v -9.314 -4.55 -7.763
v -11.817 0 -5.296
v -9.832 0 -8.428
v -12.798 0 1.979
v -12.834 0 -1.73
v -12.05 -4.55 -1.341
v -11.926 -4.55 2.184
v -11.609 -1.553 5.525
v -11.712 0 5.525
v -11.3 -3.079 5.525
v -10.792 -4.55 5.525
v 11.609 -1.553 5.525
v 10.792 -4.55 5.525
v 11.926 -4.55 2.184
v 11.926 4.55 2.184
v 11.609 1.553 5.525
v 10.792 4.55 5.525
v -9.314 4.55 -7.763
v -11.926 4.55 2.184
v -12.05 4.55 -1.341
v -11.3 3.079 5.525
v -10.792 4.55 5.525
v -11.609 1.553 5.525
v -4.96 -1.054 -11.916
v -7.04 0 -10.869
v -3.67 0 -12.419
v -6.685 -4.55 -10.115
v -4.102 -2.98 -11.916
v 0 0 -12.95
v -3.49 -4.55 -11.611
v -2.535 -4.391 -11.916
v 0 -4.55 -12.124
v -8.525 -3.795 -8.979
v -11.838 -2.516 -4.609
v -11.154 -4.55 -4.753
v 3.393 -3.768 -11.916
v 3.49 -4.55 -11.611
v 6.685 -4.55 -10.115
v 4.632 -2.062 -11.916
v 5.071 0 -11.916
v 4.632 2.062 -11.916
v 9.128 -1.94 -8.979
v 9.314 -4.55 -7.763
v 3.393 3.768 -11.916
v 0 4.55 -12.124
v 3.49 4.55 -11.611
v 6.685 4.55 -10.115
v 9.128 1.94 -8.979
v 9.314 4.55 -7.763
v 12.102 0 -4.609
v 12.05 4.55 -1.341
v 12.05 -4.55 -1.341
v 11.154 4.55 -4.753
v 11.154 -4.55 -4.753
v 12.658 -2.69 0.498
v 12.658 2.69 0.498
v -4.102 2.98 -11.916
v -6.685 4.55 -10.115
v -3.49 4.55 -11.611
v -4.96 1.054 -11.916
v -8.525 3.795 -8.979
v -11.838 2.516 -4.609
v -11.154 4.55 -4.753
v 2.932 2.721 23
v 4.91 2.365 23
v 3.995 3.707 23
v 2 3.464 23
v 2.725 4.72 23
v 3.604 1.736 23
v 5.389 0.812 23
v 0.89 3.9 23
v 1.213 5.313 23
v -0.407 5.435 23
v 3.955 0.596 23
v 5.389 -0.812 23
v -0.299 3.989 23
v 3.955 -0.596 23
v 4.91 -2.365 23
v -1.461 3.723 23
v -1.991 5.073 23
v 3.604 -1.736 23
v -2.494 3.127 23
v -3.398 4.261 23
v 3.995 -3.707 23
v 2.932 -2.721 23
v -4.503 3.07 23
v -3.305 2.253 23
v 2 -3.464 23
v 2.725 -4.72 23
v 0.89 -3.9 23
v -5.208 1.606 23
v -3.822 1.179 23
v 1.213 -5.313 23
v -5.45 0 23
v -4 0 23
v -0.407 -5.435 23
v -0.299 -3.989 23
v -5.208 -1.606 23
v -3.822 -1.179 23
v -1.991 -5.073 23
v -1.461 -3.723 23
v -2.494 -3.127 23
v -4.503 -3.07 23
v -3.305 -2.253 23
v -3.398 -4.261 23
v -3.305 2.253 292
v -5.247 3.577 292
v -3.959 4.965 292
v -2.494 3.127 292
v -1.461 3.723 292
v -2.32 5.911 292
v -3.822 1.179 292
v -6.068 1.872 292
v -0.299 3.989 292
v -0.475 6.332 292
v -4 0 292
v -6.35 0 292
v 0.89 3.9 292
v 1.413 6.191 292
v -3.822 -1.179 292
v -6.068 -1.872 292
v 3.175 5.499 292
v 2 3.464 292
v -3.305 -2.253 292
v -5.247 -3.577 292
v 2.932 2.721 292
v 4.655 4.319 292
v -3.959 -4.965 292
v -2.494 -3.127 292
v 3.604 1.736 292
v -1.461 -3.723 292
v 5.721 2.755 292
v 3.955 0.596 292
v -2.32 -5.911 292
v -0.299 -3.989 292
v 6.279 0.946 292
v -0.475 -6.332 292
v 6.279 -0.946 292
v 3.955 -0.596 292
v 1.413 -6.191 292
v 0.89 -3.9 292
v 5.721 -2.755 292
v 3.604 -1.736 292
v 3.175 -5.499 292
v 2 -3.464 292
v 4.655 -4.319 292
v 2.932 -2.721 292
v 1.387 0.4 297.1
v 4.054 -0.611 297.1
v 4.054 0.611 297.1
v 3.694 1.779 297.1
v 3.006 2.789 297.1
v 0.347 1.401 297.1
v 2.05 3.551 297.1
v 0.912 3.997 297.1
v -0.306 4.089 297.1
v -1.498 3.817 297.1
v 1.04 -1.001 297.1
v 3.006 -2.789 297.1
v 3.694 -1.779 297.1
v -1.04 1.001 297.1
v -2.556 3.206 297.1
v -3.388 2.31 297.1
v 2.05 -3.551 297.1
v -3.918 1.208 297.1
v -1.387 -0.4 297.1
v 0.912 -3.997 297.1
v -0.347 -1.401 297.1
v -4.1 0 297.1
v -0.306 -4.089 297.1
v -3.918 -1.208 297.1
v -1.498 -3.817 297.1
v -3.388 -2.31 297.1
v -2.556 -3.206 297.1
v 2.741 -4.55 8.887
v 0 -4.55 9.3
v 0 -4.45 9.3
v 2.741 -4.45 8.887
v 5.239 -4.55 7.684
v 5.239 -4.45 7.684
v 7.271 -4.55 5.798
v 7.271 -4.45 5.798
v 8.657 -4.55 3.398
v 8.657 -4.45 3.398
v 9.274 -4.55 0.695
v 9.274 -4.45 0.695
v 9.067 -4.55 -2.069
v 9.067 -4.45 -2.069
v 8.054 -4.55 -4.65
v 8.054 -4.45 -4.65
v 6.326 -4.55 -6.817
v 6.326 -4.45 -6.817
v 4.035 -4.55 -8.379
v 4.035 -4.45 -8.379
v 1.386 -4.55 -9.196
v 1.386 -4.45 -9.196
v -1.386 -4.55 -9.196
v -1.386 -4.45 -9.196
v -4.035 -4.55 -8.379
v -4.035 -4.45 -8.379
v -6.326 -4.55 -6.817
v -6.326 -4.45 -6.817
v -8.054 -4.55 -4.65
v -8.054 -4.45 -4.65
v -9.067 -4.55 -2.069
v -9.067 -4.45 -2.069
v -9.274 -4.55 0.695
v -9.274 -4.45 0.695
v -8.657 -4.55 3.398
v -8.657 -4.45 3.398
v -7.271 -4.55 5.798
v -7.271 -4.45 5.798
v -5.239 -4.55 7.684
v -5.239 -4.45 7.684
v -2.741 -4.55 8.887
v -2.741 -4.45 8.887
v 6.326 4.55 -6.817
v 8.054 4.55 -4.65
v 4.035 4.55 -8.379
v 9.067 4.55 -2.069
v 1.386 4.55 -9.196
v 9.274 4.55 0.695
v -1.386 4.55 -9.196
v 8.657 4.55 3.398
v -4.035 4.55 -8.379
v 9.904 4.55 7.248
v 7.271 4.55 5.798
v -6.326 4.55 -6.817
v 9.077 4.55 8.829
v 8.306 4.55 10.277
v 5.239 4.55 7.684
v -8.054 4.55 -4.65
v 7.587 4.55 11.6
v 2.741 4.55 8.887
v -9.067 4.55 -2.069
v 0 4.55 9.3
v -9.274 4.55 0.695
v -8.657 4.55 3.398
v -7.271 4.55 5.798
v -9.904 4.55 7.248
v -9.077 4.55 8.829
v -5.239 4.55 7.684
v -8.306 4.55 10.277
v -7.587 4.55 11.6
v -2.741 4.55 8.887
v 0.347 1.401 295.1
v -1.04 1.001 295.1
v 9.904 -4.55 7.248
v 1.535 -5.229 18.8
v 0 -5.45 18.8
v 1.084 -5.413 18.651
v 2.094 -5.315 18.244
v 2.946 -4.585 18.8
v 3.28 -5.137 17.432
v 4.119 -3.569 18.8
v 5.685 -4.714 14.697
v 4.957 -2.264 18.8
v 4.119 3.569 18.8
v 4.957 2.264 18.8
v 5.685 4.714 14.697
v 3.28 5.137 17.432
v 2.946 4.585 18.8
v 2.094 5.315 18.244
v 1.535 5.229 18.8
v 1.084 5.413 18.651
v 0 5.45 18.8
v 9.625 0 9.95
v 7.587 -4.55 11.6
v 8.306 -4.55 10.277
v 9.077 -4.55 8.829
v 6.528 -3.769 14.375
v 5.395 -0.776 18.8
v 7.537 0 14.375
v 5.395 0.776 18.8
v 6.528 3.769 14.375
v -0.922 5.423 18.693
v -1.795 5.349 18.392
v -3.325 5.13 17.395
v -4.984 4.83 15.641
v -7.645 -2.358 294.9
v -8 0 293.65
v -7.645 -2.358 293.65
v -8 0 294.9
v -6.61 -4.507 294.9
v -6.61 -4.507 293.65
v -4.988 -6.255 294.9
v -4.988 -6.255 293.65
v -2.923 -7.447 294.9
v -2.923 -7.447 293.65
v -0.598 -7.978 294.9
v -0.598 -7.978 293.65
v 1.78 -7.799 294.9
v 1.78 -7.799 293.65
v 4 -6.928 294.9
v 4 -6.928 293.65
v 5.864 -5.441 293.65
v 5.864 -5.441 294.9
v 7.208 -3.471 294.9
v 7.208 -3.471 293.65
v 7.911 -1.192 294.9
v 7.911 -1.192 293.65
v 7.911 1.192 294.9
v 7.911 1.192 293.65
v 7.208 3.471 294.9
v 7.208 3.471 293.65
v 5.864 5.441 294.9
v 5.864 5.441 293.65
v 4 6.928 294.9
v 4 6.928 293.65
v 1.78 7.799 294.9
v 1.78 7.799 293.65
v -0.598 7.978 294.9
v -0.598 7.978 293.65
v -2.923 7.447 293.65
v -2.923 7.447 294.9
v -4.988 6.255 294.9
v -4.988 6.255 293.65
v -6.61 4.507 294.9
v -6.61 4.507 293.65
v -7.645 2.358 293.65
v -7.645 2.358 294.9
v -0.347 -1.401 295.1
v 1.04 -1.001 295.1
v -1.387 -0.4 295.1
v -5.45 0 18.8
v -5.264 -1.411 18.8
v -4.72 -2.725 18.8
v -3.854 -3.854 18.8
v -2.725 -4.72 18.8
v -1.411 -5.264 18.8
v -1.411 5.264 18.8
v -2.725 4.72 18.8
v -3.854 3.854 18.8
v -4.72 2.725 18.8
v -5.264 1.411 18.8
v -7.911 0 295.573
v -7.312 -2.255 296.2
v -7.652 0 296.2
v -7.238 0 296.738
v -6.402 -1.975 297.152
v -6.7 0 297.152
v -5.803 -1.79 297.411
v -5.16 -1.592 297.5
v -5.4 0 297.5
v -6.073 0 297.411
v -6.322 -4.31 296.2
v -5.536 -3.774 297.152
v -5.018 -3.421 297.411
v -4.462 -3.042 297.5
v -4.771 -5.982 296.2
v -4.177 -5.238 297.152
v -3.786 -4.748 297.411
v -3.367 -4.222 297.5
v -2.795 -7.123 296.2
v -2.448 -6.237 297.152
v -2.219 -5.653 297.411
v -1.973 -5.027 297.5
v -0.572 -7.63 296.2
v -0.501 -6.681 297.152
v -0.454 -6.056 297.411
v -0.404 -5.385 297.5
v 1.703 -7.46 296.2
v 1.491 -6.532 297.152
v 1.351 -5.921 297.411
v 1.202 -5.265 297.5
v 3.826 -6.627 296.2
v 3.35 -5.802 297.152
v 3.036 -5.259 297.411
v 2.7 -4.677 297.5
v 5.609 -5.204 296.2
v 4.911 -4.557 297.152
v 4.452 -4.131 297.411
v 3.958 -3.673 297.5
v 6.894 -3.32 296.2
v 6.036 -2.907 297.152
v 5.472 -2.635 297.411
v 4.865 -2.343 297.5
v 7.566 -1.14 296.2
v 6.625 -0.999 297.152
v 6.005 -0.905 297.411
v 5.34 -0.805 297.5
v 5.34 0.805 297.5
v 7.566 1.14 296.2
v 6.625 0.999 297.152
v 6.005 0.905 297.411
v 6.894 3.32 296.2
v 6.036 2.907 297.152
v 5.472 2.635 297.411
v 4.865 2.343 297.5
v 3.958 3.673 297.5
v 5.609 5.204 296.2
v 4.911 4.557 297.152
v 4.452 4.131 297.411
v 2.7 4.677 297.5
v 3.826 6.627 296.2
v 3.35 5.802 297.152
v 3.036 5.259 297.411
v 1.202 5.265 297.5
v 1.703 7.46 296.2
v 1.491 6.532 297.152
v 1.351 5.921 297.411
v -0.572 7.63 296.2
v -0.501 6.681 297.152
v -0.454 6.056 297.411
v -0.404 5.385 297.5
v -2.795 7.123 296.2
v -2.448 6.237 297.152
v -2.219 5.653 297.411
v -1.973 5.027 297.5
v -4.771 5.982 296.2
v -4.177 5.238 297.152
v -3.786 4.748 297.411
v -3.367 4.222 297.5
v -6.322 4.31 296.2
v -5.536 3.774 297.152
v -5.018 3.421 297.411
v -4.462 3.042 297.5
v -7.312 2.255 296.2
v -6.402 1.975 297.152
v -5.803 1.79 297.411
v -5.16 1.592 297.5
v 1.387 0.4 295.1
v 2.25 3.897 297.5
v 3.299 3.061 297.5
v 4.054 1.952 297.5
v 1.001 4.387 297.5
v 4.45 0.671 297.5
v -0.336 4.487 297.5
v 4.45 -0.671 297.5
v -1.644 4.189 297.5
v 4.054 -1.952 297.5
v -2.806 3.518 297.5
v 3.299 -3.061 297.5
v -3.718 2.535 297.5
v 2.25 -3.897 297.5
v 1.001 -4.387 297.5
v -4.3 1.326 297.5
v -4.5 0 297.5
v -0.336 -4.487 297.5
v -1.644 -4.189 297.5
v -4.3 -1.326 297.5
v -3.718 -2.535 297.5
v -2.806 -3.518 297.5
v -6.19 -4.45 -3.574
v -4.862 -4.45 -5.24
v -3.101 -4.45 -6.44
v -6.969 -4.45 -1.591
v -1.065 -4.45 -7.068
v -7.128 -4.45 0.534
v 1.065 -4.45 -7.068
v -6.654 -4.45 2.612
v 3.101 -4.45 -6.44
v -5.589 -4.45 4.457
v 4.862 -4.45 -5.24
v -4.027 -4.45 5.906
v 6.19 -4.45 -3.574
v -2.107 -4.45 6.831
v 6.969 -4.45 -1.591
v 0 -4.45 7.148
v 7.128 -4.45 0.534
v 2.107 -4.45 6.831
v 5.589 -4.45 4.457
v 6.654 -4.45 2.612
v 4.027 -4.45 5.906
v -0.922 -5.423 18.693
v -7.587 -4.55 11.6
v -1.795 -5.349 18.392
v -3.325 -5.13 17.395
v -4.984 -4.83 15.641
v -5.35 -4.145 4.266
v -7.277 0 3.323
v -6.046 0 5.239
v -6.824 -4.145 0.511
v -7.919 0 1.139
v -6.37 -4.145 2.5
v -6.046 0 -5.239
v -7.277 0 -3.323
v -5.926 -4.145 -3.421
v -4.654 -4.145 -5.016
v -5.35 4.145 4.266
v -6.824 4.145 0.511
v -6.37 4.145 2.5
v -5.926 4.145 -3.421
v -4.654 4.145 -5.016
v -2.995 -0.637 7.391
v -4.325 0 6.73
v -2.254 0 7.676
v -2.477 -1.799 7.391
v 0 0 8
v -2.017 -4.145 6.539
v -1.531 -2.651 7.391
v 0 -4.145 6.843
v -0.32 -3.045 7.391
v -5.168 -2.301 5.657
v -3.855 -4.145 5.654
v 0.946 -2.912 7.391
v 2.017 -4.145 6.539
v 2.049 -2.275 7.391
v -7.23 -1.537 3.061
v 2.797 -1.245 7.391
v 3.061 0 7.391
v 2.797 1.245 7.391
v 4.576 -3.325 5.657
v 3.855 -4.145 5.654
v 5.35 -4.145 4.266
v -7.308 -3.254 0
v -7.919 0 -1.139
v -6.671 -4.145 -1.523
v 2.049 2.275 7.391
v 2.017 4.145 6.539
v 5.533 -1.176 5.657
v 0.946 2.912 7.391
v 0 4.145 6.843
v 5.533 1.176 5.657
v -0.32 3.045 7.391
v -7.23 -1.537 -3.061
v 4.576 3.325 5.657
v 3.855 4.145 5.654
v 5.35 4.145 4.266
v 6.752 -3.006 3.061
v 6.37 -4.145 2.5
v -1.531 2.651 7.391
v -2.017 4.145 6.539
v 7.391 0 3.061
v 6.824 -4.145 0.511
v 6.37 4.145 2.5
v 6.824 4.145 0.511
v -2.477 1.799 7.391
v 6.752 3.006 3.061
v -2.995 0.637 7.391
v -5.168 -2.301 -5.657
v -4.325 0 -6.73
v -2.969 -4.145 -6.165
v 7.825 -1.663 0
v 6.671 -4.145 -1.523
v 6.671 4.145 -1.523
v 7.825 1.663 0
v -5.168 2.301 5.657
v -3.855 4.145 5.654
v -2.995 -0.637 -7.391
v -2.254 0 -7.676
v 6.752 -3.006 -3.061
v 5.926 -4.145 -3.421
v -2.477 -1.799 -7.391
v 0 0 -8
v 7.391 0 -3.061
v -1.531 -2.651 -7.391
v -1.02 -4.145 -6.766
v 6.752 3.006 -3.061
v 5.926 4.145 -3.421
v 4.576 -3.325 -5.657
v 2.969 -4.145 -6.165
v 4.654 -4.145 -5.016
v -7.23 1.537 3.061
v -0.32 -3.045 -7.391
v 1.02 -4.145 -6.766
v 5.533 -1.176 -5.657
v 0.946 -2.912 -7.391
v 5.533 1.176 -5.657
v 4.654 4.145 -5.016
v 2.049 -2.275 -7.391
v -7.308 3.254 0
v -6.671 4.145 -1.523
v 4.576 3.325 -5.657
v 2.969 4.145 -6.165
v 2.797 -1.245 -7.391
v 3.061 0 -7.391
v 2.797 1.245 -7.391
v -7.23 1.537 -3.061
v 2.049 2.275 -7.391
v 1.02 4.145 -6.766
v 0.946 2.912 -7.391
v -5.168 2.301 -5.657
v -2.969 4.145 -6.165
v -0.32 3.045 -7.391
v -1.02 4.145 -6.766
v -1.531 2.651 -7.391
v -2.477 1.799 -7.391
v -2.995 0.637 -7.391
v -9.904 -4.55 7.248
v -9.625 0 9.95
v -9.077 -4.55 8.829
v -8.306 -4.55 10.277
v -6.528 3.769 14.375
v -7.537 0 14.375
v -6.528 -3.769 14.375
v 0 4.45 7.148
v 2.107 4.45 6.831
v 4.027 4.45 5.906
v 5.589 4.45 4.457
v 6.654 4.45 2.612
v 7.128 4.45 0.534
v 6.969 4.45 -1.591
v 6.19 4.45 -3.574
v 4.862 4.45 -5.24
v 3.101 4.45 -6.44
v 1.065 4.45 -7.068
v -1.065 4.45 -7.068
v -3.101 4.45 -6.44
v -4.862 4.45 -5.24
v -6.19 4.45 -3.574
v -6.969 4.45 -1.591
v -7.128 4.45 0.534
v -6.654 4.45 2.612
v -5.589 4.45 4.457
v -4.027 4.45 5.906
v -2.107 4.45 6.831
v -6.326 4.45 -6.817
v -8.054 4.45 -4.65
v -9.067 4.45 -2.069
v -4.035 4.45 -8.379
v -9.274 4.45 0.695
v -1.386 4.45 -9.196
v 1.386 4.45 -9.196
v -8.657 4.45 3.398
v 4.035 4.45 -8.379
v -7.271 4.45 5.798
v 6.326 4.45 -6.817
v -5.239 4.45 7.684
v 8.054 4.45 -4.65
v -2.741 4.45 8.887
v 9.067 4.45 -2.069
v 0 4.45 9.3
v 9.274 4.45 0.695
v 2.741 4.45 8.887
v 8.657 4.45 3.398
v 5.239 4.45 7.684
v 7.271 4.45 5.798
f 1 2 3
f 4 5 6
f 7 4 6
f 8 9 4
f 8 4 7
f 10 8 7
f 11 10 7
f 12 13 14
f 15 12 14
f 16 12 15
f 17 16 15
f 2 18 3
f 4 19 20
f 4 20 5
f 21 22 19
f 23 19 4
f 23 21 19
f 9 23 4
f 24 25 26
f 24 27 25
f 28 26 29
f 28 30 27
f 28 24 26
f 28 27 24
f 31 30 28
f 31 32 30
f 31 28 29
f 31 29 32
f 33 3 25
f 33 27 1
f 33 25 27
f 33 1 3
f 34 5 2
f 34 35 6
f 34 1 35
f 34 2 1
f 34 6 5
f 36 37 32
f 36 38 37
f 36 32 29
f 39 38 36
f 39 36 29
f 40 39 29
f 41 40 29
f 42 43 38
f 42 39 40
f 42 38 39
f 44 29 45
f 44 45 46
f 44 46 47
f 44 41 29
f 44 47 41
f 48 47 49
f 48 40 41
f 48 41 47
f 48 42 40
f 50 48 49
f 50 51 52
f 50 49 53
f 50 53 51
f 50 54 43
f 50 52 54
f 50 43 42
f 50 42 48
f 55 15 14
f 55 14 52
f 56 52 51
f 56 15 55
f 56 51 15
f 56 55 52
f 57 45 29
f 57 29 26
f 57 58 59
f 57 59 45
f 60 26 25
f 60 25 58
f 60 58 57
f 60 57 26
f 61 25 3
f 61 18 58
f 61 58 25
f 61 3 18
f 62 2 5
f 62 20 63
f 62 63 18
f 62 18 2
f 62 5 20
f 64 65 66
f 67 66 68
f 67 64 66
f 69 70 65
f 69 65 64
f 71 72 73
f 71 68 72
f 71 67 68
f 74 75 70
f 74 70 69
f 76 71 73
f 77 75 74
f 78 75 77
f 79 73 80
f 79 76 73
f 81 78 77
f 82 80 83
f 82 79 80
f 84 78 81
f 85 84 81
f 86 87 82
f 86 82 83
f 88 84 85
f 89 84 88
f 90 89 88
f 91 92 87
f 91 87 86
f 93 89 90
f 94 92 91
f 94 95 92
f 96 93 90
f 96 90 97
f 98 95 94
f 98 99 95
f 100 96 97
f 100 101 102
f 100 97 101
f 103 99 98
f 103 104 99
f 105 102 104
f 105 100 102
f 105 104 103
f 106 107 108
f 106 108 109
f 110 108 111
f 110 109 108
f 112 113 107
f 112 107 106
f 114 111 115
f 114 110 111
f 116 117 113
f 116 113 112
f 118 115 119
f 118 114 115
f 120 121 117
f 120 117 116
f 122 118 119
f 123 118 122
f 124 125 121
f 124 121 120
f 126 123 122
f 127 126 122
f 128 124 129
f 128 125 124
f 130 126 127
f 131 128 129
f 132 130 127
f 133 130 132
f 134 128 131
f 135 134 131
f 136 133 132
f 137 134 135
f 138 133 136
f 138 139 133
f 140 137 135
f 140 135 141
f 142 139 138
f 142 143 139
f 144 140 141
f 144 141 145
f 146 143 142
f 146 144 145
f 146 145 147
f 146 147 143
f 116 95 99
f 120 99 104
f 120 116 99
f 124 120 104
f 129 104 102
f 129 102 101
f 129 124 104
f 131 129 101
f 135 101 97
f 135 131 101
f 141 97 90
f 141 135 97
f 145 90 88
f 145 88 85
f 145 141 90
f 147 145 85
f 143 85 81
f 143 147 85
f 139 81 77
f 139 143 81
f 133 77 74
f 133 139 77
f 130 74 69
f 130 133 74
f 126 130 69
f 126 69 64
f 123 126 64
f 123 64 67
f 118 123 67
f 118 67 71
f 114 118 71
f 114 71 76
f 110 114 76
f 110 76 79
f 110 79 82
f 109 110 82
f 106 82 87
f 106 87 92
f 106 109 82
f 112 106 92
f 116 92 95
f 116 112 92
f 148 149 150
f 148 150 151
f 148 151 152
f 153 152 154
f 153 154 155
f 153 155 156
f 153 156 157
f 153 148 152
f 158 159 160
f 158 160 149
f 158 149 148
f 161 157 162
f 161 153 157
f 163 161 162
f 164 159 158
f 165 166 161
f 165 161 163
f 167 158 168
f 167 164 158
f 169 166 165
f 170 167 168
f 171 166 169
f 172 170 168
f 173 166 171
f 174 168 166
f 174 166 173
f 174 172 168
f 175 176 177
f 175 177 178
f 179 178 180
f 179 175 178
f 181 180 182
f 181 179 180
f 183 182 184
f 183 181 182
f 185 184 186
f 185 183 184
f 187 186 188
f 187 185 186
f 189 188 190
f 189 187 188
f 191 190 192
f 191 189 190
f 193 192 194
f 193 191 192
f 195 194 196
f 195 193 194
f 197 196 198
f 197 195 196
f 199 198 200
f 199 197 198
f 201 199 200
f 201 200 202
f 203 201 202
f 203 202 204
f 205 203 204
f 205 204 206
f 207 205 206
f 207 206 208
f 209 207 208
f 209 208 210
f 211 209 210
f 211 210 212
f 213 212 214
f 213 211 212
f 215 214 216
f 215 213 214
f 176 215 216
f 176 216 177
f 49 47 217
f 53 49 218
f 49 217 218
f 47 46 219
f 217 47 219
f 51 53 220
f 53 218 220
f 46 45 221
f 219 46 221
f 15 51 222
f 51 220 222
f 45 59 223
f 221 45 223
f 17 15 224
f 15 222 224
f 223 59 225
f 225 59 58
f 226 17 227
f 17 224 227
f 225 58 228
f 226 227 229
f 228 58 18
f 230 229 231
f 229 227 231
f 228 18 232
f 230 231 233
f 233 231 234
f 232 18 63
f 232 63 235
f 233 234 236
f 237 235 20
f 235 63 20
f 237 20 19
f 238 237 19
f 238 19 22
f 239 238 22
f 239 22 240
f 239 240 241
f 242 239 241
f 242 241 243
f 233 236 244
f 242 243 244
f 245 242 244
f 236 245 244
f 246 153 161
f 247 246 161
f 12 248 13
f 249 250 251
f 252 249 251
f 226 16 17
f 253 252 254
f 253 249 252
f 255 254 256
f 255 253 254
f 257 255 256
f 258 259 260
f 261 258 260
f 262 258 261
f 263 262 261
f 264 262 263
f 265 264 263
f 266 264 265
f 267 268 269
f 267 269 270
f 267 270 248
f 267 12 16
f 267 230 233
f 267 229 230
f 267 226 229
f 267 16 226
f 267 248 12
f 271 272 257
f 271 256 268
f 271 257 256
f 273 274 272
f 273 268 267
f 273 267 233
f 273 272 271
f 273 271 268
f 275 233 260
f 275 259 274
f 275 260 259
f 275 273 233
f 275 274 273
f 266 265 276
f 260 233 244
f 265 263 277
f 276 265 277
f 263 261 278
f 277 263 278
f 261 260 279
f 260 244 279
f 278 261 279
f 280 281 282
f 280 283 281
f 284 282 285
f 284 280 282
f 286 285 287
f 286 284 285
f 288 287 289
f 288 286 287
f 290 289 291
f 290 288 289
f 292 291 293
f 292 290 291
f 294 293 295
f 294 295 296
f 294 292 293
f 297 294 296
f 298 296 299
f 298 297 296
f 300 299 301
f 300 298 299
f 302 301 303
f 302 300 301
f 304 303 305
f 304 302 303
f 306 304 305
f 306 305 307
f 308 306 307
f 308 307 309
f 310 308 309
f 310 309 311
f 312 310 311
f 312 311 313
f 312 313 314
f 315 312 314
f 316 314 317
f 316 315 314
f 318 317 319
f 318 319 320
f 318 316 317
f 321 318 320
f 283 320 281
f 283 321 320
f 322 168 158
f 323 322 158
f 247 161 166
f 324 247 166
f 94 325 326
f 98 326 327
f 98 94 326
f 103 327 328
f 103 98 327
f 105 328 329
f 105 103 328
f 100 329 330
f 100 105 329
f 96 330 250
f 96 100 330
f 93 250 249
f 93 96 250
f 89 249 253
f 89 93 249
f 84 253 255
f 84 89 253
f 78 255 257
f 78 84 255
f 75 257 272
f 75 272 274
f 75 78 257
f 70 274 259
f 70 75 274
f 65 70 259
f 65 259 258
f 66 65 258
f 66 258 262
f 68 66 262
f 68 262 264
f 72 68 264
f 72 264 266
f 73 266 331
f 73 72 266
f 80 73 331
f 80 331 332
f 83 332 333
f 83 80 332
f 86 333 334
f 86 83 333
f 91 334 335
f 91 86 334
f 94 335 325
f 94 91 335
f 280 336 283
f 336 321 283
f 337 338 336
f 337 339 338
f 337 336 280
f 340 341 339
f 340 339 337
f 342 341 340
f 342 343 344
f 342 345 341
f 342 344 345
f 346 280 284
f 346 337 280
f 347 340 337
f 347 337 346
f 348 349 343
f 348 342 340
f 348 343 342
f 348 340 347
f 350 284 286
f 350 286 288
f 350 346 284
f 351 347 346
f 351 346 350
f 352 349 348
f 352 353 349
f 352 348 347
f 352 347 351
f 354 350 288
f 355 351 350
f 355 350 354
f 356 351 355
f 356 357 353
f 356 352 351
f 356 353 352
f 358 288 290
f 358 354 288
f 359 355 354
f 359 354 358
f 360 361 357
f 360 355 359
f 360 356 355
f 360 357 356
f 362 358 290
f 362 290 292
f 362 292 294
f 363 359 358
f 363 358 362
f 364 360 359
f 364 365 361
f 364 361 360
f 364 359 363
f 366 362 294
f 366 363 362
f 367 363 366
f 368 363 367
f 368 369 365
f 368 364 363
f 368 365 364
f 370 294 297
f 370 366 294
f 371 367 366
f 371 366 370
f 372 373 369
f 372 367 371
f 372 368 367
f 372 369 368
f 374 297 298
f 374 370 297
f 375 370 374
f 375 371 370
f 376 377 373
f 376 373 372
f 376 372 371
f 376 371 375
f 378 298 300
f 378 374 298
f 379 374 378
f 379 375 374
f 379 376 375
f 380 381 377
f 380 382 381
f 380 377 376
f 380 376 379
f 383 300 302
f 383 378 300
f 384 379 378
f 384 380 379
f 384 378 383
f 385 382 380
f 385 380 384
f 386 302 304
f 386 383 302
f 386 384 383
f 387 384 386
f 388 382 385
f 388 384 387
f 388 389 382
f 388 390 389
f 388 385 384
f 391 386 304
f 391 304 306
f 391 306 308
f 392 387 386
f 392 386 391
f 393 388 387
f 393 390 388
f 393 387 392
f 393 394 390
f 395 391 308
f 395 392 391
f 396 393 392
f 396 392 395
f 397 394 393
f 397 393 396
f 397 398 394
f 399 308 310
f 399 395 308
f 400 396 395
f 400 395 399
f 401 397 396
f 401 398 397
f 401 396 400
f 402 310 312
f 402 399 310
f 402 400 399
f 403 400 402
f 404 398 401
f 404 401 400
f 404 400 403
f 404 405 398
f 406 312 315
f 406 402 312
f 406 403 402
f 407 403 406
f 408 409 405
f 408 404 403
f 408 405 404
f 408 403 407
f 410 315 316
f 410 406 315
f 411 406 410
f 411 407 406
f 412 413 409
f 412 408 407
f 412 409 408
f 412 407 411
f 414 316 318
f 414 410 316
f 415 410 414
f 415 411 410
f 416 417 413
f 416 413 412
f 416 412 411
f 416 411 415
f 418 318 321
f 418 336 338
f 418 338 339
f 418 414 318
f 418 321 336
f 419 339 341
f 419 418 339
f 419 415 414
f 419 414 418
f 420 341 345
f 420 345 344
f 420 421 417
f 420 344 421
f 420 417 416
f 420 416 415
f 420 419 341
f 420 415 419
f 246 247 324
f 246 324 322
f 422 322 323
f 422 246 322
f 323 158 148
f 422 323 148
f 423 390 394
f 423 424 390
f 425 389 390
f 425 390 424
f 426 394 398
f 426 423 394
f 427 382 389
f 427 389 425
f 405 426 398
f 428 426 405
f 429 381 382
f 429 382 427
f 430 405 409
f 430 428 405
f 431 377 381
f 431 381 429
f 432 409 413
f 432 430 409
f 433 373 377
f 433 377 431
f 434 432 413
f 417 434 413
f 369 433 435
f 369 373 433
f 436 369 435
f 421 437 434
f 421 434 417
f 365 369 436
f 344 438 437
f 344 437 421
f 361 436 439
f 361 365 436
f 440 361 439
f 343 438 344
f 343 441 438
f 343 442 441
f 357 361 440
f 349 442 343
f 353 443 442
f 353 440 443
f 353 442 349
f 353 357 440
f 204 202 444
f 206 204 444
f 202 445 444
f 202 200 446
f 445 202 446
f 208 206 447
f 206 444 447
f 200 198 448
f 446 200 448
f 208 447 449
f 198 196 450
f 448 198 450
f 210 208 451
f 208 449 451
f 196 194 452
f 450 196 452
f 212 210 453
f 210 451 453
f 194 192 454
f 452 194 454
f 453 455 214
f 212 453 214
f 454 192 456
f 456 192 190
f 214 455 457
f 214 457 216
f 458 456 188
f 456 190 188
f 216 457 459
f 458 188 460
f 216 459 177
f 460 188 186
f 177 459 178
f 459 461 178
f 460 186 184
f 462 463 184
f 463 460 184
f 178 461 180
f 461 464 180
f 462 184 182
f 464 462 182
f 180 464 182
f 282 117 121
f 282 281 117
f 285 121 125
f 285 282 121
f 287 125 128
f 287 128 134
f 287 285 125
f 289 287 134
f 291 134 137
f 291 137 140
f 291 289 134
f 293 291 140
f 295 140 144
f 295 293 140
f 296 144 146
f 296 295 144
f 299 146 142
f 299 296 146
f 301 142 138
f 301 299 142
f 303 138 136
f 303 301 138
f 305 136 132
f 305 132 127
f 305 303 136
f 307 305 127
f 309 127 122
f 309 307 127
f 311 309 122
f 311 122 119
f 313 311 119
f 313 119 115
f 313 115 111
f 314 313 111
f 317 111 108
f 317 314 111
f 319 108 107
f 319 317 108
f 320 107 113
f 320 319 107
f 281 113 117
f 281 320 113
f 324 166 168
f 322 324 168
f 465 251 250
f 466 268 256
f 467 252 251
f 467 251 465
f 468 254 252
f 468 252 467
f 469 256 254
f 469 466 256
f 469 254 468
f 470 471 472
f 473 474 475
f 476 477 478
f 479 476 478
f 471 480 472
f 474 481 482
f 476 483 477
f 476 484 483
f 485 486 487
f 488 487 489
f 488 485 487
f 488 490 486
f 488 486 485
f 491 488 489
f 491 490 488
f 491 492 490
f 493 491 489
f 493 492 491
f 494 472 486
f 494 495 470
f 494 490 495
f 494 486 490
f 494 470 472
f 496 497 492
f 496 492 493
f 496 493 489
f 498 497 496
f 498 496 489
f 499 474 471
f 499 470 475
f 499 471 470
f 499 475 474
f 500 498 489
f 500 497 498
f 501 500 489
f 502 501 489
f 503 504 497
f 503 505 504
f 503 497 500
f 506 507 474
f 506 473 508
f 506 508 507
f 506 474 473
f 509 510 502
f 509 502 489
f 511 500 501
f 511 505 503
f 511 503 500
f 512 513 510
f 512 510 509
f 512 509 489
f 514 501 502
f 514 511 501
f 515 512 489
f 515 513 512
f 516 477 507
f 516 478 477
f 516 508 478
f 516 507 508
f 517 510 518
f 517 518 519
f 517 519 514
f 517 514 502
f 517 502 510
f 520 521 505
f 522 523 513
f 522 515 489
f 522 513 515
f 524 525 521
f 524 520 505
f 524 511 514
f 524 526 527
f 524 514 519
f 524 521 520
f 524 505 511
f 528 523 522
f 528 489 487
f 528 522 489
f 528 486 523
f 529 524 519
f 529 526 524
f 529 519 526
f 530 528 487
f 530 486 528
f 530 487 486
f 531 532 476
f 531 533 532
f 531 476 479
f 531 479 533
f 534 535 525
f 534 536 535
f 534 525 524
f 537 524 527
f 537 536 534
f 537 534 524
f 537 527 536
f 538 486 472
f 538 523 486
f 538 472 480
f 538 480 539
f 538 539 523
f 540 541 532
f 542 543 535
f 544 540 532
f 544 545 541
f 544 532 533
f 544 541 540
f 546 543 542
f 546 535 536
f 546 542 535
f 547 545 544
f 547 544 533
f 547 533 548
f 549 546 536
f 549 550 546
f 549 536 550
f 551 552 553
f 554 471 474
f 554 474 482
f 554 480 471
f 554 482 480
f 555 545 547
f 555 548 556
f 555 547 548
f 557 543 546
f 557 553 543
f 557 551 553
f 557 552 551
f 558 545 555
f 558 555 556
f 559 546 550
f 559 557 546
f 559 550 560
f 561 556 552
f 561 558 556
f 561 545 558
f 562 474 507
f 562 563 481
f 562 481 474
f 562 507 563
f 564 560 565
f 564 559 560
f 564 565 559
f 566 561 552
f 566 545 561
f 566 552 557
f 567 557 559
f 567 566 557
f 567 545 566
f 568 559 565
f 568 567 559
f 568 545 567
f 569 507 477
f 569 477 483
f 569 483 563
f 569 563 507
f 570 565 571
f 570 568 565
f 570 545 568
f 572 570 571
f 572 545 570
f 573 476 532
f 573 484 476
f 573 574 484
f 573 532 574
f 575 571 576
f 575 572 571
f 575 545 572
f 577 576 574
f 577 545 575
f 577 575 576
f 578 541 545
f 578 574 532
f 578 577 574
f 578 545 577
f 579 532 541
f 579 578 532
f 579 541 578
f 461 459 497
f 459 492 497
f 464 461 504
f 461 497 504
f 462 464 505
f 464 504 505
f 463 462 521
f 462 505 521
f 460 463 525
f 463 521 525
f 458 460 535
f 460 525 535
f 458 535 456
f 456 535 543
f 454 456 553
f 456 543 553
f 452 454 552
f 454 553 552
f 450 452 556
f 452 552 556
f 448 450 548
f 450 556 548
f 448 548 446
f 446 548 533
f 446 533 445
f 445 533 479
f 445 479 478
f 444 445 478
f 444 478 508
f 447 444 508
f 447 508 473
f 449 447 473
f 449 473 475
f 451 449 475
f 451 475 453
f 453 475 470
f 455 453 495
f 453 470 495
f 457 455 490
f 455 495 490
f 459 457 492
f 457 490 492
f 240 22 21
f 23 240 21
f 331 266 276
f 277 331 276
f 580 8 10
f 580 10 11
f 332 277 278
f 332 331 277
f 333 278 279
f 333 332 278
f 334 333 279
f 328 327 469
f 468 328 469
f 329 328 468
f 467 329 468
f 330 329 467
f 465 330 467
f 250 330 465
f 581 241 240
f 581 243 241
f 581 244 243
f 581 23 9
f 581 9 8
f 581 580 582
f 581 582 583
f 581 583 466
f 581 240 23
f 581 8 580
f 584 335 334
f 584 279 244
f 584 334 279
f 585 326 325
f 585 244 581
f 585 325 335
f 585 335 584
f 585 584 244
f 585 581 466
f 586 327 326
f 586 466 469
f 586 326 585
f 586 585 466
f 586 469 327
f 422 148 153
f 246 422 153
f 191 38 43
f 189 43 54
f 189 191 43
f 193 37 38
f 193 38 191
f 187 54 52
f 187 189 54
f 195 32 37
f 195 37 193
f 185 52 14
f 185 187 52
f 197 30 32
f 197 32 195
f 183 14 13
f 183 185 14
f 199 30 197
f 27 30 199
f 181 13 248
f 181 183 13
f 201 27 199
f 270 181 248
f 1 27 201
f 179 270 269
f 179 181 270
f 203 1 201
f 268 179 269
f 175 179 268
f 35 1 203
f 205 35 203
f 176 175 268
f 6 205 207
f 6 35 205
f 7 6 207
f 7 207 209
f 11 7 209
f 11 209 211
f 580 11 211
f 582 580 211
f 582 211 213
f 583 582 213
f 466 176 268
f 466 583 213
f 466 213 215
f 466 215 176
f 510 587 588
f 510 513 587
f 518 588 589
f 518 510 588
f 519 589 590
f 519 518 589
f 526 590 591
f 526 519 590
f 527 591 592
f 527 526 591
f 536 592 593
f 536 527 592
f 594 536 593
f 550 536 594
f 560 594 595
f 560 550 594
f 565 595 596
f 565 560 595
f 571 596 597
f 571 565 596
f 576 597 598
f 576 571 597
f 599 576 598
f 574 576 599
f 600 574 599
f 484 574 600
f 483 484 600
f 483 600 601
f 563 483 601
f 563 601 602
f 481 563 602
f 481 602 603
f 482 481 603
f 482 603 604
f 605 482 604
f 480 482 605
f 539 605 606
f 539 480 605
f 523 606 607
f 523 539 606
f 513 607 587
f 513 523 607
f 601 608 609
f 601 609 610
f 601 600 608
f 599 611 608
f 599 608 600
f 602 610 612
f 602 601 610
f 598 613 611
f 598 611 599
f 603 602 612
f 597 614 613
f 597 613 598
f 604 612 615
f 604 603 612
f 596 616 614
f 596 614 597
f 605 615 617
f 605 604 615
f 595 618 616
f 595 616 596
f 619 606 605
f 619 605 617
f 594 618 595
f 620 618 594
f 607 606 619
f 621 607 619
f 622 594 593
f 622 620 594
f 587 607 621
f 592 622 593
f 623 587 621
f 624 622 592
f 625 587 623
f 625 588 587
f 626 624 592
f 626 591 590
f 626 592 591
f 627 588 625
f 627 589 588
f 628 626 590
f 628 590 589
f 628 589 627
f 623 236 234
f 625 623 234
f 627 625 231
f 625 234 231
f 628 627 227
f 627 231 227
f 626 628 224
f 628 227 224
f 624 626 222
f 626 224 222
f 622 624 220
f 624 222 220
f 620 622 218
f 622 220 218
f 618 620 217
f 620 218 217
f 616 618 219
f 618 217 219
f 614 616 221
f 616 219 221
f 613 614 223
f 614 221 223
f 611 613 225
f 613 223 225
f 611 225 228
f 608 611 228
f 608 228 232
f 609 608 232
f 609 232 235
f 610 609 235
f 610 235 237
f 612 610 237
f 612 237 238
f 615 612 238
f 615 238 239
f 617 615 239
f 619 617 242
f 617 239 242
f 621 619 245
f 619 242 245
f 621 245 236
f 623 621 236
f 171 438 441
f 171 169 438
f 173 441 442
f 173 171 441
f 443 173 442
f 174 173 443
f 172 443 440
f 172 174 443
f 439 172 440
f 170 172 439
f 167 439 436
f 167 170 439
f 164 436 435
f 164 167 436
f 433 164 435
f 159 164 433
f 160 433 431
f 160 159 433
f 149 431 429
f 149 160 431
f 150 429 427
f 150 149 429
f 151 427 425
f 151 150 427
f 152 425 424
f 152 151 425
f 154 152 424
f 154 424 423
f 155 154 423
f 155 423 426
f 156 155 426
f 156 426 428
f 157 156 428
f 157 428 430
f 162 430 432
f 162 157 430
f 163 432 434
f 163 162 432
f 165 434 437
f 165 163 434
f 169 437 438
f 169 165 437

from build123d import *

# Parameters (mm, degrees)
EXTRUDE1_DEPTH      = 2
EXTRUDE2_DEPTH      = 299.063172834
EXTRUDE2_DEPTH_BACK = 299.063172834
SKETCH4_R           = 9.3
EXTRUDE3_DEPTH      = 0.1
CHAMFER1_SIZE       = 0.5


with BuildPart() as part:
    # Sketch1 → Revolve1 (revolve)
    with BuildSketch(Plane(origin=(0, 0, 0), x_dir=(1, 0, 0), z_dir=(0, 1, 0))):
        with BuildLine():
            Line((-11.712232269, -5.525044369), (-5.45, -18.8))
            Line((-5.45, -18.8), (-5.45, -23))
            Line((-5.45, -23), (-4, -23))
            Line((-4, -23), (-4, -292))
            Line((-4, -292), (-6.35, -292))
            Line((-6.35, -292), (-8, -293.65))
            Line((-8, -293.65), (-8, -294.9))
            ThreePointArc((-8, -294.9), (-7.238477631, -296.738477631), (-5.4, -297.5))
            Line((-5.4, -297.5), (-4.5, -297.5))
            Line((-4.5, -297.5), (-4.1, -297.1))
            Line((-4.1, -297.1), (0, -297.1))
            Line((0, -297.1), (0, -8))
            ThreePointArc((0, -8), (-8, 0), (0, 8))
            Line((0, 8), (0, 12.95))
            ThreePointArc((0, 12.95), (-10.937363132, 6.933728269), (-11.712232269, -5.525044369))
        make_face()
    revolve(axis=Axis((0, 0, 0), (0, 0, 1)))

    # Sketch2 → Extrude1 (cut)
    with BuildSketch(Plane.XY.offset(297.1)):
        Polygon((1.38672922, 0.400394061), (0.346613181, 1.401139763), (-1.040116039, 1.000745702), (-1.38672922, -0.400394061), (-0.346613181, -1.401139763), (1.040116039, -1.000745702), align=None)
    extrude(amount=-EXTRUDE1_DEPTH, mode=Mode.SUBTRACT)

    # Sketch3 → Extrude2 (cut, two sides: drawn at the far end of the back side and taken through both)
    with BuildSketch(Plane(origin=(0, 0, 0), x_dir=(0, 0, -1), z_dir=(1, 0, 0)).offset(-EXTRUDE2_DEPTH_BACK)):
        with BuildLine():
            Line((18.703975577, 4.55), (-11.6, 4.55))
            ThreePointArc((-11.6, 4.55), (-15.228015987, 4.775872106), (-18.8, 5.45))
            Line((-18.8, 5.45), (-23, 5.45))
            Line((-23, 5.45), (-23, 17.731418952))
            Line((-23, 17.731418952), (18.703975577, 17.731418952))
            Line((18.703975577, 17.731418952), (18.703975577, 4.55))
        make_face()
        with BuildLine():
            Line((18.703975577, -17.731418952), (18.703975577, -4.55))
            Line((18.703975577, -4.55), (-11.6, -4.55))
            ThreePointArc((-11.6, -4.55), (-15.228015987, -4.775872106), (-18.8, -5.45))
            Line((-18.8, -5.45), (-23, -5.45))
            Line((-23, -5.45), (-23, -17.731418952))
            Line((-23, -17.731418952), (18.703975577, -17.731418952))
        make_face()
    extrude(amount=EXTRUDE2_DEPTH + EXTRUDE2_DEPTH_BACK, mode=Mode.SUBTRACT)

    # Sketch4 → Extrude3 (cut)
    with BuildSketch(Plane(origin=(0, 4.55, 0), x_dir=(1, 0, 0), z_dir=(0, 1, 0))):
        with Locations(Location((0, 0, 0), (0, 0, 270))):
            Circle(SKETCH4_R)
    extrude3 = extrude(amount=-EXTRUDE3_DEPTH, mode=Mode.SUBTRACT)

    # Mirror1: Extrude3 across plane
    add(extrude3.mirror(Plane.ZX), mode=Mode.SUBTRACT)

    # Chamfer1
    # the kernel refuses this chamfer: 0.5, 0.360421404 mm, written as the material it takes off along each edge
    with BuildSketch(Plane(origin=(0, 4.45, 0), x_dir=(0, 0, 1), z_dir=(-1, 0, 0))) as chamfer1_piece_1:
        with BuildLine():
            Line((6.648120035 + CHAMFER1_SIZE, 0), (6.842696069, -0.305423966))
            ThreePointArc((6.842696069, -0.305423966), (6.748300889, -0.153439154), (6.648120035, 0))
            Line((6.648120035, 0), (6.648120035 + CHAMFER1_SIZE, 0))
        make_face()
    revolve(axis=Axis((0, 4.45, 0), (0, 1, 0)), mode=Mode.SUBTRACT)
    with BuildSketch(Plane(origin=(0, -4.45, 0), x_dir=(0, 0, 1), z_dir=(-1, 0, 0))) as chamfer1_piece_2:
        with BuildLine():
            Line((6.648120035 + CHAMFER1_SIZE, 0), (6.842696069, 0.305423966))
            ThreePointArc((6.842696069, 0.305423966), (6.748300889, 0.153439154), (6.648120035, 0))
            Line((6.648120035, 0), (6.648120035 + CHAMFER1_SIZE, 0))
        make_face()
    revolve(axis=Axis((0, -4.45, 0), (0, 1, 0)), mode=Mode.SUBTRACT)


solid = part.part
